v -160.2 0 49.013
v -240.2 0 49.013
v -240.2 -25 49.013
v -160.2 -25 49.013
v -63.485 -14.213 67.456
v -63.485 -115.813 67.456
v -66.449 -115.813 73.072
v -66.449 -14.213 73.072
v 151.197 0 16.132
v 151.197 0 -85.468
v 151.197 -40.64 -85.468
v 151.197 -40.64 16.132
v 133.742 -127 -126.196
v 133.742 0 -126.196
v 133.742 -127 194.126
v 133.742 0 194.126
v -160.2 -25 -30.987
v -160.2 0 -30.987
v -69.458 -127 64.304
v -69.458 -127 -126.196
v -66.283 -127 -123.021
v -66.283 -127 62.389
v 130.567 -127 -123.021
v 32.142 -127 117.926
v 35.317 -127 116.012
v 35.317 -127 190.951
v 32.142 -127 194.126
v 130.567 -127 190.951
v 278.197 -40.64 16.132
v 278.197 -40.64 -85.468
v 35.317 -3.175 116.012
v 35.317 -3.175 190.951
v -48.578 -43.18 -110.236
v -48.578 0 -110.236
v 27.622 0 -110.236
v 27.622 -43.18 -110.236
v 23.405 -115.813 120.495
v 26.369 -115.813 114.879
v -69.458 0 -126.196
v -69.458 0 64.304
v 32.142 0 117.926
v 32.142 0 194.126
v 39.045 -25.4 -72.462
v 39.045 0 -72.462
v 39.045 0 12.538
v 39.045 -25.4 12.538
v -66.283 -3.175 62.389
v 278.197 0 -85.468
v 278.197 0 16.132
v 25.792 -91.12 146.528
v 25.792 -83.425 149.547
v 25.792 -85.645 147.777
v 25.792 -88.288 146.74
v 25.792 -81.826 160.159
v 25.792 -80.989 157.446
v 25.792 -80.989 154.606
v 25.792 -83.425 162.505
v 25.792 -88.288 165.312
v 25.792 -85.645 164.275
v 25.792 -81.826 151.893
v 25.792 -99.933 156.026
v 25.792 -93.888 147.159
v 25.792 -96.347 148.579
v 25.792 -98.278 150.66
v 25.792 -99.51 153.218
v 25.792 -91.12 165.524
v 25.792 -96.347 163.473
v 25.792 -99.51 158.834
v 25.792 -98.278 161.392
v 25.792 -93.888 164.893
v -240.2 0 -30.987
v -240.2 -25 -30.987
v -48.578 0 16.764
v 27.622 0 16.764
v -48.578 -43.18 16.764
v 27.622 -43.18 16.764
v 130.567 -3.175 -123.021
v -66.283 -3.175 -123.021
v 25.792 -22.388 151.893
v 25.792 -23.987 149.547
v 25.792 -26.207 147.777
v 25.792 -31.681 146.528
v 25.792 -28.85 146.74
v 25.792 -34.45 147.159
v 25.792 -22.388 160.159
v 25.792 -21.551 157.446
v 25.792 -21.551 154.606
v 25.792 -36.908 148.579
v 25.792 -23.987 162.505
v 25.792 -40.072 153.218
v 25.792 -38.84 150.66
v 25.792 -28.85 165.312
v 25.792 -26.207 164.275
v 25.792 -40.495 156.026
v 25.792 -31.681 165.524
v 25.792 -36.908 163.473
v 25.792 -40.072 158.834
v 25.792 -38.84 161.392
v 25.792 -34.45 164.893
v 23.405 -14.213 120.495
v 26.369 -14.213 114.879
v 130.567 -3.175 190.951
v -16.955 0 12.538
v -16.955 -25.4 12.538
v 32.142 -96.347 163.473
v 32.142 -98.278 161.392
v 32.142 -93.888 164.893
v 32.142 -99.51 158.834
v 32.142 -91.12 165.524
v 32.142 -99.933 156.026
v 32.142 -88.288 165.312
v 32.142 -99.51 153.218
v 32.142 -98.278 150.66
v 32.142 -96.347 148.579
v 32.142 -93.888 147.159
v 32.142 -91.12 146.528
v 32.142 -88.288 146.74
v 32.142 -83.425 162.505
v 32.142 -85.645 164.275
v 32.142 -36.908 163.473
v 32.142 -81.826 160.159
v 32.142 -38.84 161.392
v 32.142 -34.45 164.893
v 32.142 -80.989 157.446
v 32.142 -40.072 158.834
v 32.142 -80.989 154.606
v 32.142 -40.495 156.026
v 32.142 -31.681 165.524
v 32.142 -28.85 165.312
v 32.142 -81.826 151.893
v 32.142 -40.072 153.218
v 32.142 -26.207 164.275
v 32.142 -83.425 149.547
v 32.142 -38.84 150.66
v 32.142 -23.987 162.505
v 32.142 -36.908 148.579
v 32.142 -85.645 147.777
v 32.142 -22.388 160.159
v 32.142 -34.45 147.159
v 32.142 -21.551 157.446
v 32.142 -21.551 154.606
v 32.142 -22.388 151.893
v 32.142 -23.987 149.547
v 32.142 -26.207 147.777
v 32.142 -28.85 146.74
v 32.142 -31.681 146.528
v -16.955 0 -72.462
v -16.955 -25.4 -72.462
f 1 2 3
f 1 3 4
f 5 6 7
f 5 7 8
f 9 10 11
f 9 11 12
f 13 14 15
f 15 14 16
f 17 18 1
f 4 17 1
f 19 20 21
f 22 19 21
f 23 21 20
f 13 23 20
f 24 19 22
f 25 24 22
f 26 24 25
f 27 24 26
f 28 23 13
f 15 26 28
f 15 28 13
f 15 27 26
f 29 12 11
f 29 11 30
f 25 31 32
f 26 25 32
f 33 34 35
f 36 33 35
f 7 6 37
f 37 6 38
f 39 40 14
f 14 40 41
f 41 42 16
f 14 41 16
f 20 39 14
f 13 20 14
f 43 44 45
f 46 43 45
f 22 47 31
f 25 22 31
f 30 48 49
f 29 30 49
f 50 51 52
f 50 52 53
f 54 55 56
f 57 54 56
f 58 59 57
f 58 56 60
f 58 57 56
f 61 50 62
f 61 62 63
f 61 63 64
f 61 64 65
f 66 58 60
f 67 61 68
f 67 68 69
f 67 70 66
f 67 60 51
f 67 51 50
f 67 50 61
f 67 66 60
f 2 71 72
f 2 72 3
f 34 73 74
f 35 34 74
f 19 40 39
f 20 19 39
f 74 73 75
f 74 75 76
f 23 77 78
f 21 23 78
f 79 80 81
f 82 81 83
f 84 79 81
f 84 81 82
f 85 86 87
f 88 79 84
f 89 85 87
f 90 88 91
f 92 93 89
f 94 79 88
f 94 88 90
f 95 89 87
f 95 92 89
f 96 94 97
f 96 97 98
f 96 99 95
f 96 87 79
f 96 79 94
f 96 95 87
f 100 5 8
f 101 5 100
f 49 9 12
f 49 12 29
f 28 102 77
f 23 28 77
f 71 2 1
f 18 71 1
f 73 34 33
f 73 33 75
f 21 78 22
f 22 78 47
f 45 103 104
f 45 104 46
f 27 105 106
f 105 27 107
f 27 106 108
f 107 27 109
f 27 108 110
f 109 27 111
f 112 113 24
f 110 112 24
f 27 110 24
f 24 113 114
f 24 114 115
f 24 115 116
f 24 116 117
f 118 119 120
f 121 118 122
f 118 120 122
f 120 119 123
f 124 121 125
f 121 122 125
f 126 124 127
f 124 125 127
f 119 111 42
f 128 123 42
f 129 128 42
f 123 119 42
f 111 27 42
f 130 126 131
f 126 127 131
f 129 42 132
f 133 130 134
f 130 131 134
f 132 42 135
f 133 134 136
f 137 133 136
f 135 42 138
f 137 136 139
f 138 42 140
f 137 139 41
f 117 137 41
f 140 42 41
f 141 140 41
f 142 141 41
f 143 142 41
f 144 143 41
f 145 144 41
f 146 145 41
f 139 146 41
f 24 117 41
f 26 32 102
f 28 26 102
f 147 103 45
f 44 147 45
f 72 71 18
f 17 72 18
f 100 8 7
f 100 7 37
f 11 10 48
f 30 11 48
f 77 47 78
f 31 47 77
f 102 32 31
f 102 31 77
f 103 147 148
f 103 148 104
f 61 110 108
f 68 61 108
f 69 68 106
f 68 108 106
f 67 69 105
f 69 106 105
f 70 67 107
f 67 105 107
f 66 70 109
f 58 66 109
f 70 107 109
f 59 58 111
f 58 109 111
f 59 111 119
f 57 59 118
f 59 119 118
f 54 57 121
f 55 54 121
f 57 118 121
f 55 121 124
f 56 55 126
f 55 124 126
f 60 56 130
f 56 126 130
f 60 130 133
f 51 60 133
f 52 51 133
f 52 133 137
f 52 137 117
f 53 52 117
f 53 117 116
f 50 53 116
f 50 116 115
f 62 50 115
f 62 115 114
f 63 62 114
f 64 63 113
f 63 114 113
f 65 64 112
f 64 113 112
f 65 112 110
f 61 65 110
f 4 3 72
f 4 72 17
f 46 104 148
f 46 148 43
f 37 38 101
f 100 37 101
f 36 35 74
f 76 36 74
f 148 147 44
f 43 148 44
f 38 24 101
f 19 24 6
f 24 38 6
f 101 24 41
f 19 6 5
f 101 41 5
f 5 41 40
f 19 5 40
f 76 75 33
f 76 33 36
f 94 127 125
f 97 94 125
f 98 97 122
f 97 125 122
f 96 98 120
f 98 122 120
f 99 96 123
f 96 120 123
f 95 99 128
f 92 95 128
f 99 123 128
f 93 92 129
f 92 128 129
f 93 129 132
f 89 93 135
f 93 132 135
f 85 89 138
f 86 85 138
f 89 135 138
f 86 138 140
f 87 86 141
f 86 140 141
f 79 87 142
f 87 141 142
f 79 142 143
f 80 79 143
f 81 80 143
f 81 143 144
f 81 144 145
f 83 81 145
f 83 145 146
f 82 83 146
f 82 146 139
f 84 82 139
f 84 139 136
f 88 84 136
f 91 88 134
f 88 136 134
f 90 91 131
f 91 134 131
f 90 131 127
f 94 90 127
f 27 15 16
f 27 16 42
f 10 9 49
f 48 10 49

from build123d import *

# Parameters (mm, degrees)
F1_DEPTH  = 127
F2_DEPTH  = 3.175
F3_W      = 56
F3_H      = 85.000084
F4_DEPTH  = 25.4
F5_W      = 76.2
F5_H      = 127
F6_DEPTH  = 43.18
F7_W      = 127
F7_H      = 101.6
F8_DEPTH  = 40.64
F9_W      = 80
F9_H      = 80
F10_DEPTH = 25
F11_W     = 101.6
F11_H     = 101.6
F12_DEPTH = 6.35
F13_R     = 9.525
F14_DEPTH = 6.35


with BuildPart() as f1:
    # F0 (on Front) → F1 (new body)
    with BuildSketch(Plane.XZ):
        Polygon((-69.4583011687, 64.3037520634), (-69.4583011687, -126.1962479366), (133.7416988313, -126.1962479366), (133.7416988313, 105.5787520634), (133.7416988313, 194.1259615968), (32.1416988313, 194.1259615968), (32.1416988313, 117.9259615968), align=None)
        Polygon((-66.2833011687, -123.0212479366), (-66.2833011687, 62.3893798805), (35.3166988313, 116.0115894138), (35.3166988313, 190.9509615968), (130.5666988313, 190.9509615968), (130.5666988313, 105.5787520634), (130.5666988313, -123.0212479366), align=None, mode=Mode.SUBTRACT)
    extrude(amount=F1_DEPTH)

    # F0 (on Front) → F2 (join)
    with BuildSketch(Plane.XZ):
        Polygon((35.3166988313, 116.0115894138), (-66.2833011687, 62.3893798805), (-66.2833011687, -123.0212479366), (130.5666988313, -123.0212479366), (130.5666988313, 105.5787520634), (130.5666988313, 190.9509615968), (35.3166988313, 190.9509615968), align=None)
    extrude(amount=F2_DEPTH)

    # F11 (on face) → F12 (join)
    with BuildSketch(Plane(origin=(-41.6766433185, 0, 78.9662902369), x_dir=(0.8843847984, 0, 0.4667585332), z_dir=(-0.4667585332, 0, 0.8843847984))):
        with Locations((26.1407637417, -65.0126294613)):
            Rectangle(F11_W, F11_H)
    extrude(amount=F12_DEPTH)

    # F13 (on face) → F14 (join)
    with BuildSketch(Plane(origin=(32.1416988313, 0, 0), x_dir=(0, -1, 0), z_dir=(-1, 0, 0))):
        with Locations((30.9696756303, 156.0259615968)):
            Circle(F13_R)
        with Locations((90.4077887535, 156.0259615968)):
            Circle(F13_R)
    extrude(amount=F14_DEPTH)


with BuildPart() as f4:
    # F3 (on Front) → F4 (new body)
    with BuildSketch(Plane.XZ):
        with Locations((11.0449163035, -29.9619909192)):
            Rectangle(F3_W, F3_H)
    extrude(amount=F4_DEPTH)


with BuildPart() as f6:
    # F5 (on Front) → F6 (new body)
    with BuildSketch(Plane.XZ):
        with Locations((-10.4780673653, -46.7363045835)):
            Rectangle(F5_W, F5_H)
    extrude(amount=F6_DEPTH)


with BuildPart() as f8:
    # F7 (on Front) → F8 (new body)
    with BuildSketch(Plane.XZ):
        with Locations((214.6972416401, -34.6680016637)):
            Rectangle(F7_W, F7_H)
    extrude(amount=F8_DEPTH)


with BuildPart() as f10:
    # F9 (on Front) → F10 (new body)
    with BuildSketch(Plane.XZ):
        with Locations((-200.1996668577, 9.0134921074)):
            Rectangle(F9_W, F9_H)
    extrude(amount=F10_DEPTH)


solid = Compound([f1.part, f4.part, f6.part, f8.part, f10.part])
